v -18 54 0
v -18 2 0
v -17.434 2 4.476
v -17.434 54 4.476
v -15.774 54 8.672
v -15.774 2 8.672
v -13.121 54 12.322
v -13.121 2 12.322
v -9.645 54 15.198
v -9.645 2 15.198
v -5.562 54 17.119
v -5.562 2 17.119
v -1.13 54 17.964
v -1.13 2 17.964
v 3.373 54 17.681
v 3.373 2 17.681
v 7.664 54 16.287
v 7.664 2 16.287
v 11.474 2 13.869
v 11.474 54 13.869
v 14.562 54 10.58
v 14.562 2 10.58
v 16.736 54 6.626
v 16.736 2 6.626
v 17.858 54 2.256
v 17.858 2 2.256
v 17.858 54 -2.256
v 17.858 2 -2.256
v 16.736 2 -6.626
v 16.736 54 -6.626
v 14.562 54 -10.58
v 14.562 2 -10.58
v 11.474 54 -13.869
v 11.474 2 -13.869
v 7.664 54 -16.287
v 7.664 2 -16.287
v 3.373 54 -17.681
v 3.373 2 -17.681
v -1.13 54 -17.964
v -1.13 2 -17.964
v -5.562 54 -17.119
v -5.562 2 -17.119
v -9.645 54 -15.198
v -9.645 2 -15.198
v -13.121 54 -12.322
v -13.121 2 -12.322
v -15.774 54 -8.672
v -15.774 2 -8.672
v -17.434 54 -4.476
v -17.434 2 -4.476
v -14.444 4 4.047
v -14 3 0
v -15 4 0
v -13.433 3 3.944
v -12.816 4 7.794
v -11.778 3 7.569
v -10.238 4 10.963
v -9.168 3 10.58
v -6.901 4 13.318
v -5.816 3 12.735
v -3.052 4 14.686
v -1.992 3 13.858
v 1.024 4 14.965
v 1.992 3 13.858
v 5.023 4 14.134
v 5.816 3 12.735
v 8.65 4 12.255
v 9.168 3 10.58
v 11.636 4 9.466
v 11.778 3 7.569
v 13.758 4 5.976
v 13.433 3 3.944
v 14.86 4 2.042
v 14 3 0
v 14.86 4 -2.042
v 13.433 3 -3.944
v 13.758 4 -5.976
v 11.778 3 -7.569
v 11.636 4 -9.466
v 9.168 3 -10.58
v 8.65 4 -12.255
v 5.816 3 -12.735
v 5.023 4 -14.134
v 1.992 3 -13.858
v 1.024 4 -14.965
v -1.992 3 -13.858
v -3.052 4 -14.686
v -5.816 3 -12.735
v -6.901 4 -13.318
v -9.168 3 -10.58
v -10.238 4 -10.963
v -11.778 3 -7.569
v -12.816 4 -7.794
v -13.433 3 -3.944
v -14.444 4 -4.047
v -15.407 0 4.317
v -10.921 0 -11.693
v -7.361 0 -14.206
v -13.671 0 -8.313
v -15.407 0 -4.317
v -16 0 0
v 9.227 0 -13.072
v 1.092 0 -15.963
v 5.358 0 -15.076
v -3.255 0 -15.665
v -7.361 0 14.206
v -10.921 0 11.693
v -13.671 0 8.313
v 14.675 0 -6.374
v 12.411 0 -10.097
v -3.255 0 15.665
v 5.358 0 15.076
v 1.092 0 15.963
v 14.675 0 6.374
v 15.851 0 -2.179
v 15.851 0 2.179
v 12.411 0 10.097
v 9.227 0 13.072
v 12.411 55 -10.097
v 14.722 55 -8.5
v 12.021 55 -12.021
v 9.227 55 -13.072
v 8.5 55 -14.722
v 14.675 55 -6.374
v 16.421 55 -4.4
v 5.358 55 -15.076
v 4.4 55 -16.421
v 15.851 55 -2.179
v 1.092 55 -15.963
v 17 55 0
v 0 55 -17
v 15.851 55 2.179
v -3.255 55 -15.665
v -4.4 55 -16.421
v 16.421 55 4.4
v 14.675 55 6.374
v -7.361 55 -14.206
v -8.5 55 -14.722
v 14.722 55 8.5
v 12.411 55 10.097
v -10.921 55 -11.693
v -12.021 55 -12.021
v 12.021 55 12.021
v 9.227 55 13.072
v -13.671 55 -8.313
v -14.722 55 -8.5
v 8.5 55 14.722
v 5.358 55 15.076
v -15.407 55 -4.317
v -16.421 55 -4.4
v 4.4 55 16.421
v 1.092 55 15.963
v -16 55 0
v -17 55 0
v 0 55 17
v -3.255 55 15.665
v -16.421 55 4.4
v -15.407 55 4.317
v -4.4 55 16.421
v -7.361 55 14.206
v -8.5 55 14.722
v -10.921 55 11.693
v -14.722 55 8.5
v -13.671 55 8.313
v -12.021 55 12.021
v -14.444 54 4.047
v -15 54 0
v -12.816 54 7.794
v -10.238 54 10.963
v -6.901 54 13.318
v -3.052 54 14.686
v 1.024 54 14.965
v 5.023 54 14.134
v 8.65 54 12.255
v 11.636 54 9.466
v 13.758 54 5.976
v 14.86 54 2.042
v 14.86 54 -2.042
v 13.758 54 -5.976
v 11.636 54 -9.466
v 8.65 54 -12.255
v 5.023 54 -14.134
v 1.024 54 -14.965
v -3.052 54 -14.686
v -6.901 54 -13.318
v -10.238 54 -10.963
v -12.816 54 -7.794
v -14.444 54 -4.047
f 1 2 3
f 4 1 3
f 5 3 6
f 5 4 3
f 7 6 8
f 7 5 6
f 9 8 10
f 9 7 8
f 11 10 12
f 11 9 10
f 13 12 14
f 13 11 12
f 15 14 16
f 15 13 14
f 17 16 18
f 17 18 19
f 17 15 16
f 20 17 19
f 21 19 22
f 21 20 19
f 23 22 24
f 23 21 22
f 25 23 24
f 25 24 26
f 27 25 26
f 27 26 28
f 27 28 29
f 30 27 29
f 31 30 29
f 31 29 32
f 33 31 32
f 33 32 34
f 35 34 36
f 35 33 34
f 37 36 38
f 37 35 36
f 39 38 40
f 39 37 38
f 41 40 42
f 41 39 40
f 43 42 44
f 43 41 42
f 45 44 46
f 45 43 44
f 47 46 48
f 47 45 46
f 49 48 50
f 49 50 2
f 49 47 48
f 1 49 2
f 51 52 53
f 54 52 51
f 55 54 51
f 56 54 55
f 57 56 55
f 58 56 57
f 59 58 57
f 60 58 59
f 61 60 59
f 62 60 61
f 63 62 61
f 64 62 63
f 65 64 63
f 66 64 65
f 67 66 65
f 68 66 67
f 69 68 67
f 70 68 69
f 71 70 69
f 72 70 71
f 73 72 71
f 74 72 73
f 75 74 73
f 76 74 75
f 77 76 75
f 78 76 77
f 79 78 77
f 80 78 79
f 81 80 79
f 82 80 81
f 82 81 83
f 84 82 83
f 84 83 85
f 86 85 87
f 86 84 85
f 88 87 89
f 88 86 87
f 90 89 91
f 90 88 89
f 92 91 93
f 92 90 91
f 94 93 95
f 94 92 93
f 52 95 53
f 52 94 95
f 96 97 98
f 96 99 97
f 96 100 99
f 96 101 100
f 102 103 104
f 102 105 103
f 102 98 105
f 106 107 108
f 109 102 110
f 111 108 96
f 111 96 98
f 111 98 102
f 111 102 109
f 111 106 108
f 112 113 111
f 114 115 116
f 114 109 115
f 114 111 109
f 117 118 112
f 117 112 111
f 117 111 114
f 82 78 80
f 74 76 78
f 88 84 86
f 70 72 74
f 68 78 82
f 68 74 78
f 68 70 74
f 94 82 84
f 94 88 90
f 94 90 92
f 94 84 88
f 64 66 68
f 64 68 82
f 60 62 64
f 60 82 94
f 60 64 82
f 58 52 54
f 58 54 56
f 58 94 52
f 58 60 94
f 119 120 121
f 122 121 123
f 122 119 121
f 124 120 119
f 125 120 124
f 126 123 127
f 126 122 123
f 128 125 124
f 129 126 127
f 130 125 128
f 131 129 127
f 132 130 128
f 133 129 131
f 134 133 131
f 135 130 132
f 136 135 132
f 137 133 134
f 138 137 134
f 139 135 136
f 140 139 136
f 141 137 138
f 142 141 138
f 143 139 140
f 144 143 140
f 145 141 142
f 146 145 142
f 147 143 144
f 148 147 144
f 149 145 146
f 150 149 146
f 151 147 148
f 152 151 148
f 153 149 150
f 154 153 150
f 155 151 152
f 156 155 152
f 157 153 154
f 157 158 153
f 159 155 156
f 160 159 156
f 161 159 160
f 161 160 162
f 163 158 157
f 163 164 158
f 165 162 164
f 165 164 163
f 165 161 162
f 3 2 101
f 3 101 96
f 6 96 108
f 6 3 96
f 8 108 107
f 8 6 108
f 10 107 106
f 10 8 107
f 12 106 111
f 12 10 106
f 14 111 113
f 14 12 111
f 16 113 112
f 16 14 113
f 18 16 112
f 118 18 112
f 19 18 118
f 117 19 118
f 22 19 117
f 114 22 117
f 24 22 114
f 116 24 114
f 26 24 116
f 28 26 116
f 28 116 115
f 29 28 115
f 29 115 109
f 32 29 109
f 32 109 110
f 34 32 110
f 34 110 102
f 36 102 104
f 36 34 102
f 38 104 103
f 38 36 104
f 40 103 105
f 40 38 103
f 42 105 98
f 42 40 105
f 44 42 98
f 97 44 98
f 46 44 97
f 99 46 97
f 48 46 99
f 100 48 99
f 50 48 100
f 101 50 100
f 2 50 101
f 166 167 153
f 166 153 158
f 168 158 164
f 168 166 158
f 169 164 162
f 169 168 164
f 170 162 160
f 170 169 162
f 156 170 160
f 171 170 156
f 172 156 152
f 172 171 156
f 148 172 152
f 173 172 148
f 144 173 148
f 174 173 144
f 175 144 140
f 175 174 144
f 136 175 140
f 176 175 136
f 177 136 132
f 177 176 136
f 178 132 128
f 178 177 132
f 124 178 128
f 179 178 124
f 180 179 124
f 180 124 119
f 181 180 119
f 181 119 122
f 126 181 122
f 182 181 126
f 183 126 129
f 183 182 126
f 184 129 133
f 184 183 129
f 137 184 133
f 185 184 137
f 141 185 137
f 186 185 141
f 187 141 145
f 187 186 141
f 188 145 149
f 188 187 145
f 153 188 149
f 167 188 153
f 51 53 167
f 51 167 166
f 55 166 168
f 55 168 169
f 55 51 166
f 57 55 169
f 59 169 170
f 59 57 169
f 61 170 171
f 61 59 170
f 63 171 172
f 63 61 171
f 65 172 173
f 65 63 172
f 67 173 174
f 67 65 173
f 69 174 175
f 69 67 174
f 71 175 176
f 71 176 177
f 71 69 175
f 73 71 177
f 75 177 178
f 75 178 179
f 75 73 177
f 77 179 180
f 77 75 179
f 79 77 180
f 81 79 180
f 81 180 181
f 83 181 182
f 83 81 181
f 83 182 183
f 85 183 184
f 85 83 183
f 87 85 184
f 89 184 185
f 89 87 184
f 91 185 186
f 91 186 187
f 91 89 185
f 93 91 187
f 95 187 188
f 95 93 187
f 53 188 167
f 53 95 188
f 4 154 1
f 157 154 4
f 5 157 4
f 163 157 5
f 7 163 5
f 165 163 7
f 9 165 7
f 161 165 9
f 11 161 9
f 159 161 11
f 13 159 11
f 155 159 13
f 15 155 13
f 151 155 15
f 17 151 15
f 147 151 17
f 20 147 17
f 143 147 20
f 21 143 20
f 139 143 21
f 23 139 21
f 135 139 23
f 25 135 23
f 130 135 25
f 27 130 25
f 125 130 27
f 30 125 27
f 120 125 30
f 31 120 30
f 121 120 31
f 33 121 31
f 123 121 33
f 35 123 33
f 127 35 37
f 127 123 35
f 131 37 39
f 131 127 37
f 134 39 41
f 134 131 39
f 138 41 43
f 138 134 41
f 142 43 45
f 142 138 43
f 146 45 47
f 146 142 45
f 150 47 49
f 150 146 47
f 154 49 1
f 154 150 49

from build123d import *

# Parameters (mm, degrees)
CHAMFER_1_SIZE = 2
CHAMFER_2_SIZE = 1
CHAMFER_3_SIZE = 1


with BuildPart() as part:
    # Эскиз1 → Повернуть1 (revolve)
    with BuildSketch(Plane.XY):
        Polygon((0, 0), (-18, 0), (-18, 55), (-15, 55), (-15, 3), (0, 3), align=None)
    revolve(axis=Axis((0, 3, 0), (0, 1, 0)))

    # Фаска1
    chamfer_1_edges = [part.edges().sort_by_distance(p)[0] for p in [
        (18, 0, 0),
    ]]
    chamfer(chamfer_1_edges, length=CHAMFER_1_SIZE)

    # Фаска2
    chamfer_2_edges = [part.edges().sort_by_distance(p)[0] for p in [
        (15, 55, 0),
        (18, 55, 0),
    ]]
    chamfer(chamfer_2_edges, length=CHAMFER_2_SIZE)

    # Фаска3
    chamfer_3_edges = [part.edges().sort_by_distance(p)[0] for p in [
        (15, 3, 0),
    ]]
    chamfer(chamfer_3_edges, length=CHAMFER_3_SIZE)


solid = part.part
